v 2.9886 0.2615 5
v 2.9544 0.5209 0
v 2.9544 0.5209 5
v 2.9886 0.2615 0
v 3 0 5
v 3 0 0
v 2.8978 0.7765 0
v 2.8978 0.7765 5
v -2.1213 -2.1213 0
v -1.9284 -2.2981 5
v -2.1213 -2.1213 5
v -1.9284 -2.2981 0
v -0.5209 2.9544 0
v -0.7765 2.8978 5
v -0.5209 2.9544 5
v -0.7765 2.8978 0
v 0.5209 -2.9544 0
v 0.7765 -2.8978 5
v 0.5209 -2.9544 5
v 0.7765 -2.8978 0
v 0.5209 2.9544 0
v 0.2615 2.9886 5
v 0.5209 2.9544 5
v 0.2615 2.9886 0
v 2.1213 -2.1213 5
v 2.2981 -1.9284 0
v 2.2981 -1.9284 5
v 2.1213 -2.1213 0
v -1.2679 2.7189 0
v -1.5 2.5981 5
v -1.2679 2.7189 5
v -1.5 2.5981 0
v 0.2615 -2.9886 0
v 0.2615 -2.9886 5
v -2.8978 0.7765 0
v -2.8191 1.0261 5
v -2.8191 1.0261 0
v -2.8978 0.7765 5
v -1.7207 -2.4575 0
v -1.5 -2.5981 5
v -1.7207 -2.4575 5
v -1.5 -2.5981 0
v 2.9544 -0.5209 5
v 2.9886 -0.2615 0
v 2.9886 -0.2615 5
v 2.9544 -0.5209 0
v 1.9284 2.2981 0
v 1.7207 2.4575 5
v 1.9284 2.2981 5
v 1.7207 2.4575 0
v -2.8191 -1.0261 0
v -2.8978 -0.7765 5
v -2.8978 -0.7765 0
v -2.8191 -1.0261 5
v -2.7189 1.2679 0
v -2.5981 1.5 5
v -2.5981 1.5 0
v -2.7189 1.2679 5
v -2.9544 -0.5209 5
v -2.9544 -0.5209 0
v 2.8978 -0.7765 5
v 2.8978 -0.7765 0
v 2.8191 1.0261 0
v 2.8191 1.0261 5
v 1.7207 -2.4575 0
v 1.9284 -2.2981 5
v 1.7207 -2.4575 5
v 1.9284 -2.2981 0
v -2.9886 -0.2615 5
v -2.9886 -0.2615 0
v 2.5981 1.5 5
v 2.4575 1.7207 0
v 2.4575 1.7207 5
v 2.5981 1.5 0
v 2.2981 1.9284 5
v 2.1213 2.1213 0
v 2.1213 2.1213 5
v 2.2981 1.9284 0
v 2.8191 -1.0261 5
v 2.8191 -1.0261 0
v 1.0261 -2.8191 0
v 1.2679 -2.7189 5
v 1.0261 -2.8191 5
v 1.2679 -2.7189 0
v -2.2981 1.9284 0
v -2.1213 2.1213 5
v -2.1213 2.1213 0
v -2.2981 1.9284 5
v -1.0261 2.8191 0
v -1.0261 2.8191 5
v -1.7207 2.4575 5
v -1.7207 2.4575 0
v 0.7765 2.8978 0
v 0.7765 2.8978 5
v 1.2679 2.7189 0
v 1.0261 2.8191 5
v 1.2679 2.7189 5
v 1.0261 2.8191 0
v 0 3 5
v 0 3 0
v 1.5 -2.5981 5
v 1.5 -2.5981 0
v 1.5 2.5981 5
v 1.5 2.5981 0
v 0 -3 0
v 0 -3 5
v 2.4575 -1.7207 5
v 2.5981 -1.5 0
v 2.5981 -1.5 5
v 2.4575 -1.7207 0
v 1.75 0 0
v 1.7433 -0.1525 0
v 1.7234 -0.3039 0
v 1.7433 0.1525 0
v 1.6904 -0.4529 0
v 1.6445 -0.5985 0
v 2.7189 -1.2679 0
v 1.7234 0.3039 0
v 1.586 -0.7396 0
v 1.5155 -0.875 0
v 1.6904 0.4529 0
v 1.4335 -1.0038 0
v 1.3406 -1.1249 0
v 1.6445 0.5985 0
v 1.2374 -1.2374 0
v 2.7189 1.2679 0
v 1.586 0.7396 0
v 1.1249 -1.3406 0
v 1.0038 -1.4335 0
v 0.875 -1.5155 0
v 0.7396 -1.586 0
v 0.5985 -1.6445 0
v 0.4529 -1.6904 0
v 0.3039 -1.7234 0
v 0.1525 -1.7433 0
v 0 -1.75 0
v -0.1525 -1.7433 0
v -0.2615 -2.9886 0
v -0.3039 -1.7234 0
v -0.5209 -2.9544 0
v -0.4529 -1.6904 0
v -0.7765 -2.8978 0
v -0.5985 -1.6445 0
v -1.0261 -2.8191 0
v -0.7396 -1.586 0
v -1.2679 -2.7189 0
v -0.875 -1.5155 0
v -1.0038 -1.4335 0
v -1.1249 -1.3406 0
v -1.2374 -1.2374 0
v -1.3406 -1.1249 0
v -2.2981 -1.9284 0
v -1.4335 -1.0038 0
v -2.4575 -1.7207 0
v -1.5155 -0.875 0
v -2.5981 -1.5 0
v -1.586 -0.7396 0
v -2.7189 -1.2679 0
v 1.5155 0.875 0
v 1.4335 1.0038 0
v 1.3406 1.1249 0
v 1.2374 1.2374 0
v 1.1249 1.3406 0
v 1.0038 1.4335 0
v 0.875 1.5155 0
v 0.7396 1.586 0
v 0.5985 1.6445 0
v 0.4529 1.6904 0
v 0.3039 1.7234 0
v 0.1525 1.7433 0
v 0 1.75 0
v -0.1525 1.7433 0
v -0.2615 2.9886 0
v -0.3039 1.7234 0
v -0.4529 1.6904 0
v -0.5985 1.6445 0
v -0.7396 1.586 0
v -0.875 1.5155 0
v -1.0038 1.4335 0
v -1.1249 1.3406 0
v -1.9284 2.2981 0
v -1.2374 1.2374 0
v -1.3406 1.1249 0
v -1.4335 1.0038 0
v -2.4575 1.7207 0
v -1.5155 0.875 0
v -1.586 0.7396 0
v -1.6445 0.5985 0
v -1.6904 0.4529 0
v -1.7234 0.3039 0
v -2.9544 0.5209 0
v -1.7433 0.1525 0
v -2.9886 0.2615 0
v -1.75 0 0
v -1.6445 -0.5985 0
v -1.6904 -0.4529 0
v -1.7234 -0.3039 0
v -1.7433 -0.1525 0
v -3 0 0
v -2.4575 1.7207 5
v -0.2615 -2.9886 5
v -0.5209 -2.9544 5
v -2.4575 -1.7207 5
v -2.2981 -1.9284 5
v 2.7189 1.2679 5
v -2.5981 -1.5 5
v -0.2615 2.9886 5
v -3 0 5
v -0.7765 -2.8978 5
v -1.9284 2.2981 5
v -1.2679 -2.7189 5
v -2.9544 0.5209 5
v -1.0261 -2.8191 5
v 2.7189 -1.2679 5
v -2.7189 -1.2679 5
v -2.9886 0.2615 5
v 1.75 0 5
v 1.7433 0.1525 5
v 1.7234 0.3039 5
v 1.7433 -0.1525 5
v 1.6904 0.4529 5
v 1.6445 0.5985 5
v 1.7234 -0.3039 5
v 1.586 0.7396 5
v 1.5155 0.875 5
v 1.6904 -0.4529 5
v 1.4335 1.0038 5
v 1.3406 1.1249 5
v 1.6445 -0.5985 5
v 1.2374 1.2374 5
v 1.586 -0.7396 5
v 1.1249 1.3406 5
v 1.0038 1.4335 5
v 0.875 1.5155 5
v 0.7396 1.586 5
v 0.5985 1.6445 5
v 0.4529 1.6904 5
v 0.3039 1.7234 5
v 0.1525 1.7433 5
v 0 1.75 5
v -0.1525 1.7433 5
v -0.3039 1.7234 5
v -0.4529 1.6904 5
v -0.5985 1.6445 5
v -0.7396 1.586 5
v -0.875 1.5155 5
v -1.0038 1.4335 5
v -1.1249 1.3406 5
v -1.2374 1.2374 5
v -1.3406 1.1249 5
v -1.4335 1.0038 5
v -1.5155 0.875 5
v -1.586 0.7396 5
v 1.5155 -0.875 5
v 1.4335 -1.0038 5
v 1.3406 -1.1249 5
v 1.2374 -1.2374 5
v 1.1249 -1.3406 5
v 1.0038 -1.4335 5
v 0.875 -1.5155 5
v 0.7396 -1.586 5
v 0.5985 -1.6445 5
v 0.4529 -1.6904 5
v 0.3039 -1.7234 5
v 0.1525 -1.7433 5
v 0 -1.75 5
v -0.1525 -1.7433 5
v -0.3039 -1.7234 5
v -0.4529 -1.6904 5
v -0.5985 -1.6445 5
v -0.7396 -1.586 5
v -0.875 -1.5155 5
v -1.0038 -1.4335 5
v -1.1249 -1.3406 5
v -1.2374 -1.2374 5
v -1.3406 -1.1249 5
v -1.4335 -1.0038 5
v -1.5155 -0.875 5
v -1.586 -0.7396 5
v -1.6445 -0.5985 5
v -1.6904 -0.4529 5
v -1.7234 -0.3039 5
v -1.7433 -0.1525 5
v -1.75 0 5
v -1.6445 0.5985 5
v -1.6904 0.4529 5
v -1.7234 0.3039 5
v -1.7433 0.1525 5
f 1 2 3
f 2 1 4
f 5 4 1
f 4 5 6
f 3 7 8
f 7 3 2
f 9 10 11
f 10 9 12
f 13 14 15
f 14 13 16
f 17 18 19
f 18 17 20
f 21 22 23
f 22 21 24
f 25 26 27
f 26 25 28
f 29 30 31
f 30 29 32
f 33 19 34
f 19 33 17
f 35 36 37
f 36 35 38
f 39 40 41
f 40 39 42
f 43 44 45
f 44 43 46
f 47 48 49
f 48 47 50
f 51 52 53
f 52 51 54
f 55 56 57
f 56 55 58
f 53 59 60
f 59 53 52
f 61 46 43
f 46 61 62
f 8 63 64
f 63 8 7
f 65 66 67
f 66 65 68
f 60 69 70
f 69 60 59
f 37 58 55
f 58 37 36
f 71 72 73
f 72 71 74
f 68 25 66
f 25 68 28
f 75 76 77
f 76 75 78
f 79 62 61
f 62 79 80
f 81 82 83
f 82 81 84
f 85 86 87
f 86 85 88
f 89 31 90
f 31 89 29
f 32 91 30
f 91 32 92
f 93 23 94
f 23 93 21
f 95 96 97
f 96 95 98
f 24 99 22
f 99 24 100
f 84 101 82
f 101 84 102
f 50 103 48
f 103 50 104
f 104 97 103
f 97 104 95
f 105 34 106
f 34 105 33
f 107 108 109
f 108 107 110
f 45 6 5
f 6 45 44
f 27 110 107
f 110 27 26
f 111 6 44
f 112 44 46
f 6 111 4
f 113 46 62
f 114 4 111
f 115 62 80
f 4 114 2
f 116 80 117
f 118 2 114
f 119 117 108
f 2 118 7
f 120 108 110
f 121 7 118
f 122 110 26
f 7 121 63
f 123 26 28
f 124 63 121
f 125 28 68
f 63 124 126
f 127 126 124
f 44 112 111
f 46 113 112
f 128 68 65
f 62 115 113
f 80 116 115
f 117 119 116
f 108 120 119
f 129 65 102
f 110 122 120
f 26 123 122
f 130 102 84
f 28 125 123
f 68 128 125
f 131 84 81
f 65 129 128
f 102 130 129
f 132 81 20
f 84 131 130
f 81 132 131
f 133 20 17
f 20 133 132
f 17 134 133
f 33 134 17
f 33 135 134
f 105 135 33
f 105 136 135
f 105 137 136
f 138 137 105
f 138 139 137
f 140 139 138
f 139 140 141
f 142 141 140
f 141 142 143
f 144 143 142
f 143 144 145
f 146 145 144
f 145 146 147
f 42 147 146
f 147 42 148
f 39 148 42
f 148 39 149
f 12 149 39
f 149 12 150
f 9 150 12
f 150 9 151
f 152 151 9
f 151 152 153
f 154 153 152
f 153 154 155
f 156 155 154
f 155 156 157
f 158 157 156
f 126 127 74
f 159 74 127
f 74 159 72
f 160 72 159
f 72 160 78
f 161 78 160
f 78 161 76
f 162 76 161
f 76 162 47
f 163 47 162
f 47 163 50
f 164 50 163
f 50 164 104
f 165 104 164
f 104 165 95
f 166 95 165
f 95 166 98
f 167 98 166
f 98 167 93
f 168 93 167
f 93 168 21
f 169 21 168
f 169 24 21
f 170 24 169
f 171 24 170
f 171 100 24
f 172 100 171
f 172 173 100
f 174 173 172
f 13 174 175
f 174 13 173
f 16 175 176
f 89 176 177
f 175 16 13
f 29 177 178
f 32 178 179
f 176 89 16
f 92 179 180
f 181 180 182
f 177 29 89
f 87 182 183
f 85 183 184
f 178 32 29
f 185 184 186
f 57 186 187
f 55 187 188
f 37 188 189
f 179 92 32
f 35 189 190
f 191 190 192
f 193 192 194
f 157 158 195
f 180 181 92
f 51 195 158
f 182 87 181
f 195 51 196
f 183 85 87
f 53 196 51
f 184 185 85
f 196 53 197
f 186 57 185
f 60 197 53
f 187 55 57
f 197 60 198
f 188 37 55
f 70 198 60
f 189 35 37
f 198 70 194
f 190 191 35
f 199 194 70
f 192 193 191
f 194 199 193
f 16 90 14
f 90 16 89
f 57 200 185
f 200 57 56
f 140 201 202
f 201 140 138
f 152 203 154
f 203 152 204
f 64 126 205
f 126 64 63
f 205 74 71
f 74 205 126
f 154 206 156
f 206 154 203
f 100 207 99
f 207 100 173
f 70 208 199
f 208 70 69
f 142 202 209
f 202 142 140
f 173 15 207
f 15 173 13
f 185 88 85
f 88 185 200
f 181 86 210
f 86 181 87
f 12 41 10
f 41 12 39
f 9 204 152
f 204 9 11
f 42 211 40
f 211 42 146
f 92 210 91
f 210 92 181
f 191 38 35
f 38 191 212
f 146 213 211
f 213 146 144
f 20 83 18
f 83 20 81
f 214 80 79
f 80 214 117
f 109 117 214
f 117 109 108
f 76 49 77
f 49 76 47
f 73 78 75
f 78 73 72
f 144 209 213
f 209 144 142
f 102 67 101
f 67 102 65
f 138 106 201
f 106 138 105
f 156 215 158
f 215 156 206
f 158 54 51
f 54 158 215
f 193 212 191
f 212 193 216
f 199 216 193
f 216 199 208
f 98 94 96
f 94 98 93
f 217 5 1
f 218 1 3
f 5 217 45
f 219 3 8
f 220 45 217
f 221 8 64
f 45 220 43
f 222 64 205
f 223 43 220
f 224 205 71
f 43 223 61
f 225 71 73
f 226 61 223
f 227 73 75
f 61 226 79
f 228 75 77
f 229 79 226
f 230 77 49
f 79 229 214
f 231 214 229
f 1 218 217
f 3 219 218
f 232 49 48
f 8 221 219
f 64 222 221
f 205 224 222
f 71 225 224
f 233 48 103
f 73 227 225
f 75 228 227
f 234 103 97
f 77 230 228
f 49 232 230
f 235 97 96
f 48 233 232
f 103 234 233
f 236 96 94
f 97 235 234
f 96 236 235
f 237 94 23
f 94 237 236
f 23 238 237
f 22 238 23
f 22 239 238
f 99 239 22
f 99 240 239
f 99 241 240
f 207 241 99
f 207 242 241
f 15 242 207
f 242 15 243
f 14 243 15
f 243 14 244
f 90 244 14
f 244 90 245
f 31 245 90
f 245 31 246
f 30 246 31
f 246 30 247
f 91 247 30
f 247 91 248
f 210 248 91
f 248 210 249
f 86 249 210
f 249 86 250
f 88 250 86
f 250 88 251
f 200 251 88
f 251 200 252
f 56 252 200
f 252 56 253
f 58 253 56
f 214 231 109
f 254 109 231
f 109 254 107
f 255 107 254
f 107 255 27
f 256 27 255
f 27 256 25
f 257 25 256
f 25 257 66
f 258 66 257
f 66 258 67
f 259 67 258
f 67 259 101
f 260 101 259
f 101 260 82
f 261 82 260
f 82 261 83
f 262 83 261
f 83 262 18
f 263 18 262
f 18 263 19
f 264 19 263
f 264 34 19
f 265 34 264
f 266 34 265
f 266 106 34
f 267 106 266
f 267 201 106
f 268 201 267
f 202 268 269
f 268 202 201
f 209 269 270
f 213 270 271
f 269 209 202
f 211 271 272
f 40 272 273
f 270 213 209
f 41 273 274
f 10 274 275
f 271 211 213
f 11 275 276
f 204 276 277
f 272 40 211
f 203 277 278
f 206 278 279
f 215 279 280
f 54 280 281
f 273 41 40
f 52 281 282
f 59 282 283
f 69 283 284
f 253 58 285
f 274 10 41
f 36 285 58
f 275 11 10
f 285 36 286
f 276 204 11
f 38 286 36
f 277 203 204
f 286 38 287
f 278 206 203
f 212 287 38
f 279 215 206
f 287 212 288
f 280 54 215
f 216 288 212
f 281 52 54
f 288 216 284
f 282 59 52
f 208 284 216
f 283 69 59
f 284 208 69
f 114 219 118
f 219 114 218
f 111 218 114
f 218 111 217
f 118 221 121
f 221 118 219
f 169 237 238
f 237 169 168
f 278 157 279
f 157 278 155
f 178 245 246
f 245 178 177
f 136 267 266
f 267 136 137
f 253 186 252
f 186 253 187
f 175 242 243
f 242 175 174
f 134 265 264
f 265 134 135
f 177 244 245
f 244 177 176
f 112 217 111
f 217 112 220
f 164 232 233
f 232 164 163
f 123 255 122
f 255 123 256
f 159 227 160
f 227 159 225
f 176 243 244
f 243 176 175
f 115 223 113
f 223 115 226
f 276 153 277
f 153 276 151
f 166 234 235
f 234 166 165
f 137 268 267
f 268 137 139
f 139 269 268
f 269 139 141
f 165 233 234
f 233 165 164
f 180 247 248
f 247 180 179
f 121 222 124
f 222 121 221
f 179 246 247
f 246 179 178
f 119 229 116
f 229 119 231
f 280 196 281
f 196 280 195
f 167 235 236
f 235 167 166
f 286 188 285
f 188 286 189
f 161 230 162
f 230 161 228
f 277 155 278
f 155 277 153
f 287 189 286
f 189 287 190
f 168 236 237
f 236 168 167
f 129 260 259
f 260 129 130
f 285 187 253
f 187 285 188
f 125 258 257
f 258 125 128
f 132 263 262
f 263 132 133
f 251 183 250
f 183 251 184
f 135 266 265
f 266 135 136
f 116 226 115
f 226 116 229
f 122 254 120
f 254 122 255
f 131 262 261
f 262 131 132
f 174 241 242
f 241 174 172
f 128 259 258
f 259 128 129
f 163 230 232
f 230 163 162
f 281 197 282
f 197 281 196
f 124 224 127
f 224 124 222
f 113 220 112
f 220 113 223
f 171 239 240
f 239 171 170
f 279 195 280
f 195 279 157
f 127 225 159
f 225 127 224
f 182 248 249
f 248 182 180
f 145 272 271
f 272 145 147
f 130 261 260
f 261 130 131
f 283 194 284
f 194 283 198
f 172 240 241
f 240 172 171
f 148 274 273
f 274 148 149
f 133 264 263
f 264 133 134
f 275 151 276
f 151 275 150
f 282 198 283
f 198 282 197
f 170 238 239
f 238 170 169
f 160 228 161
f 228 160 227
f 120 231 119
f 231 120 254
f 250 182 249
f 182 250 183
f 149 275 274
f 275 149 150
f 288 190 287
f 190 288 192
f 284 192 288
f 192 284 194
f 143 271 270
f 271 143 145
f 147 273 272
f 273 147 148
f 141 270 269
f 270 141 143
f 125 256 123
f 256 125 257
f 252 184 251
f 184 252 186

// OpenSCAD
// file: param.scad
$fa = 5; //5  minimum=0.01
$fs = 0.1; //0.1  minimum=0.01

/////base params
R = 24;
r = 3;
l = 1.8; //eccentric shaft dist

/////roter
ecce = 1.8;
d_ecceshaft = 7.6;
l_eccesleeve_h = 0.5;
l_roter_thick = 3.5;
d_eccebearing = 14;
d_eccebearing_fr = 16.5;
l_eccebearing_h = 4;
l_eccebearing_fr = 0.8;


/////motor shaft
d_motshaft = 5;
l_motshaft = 8;//13;
l_motshafthld = l_motshaft+7;
l_motecceshaft = l_motshaft+11.7;

d_shaftholder = 10;


/////outer-pole
//spacer 3x6x5
d_pole = 6;
l_pole = 5;
d_pole_hole = 3.5;

d_pole_position = (R+r)*2;
ROTER2OUTERPIN_GAP = 0.15;


/////bottom-plate
l_bottmoplate_h = 4;

/////outpin
th_outp_angle = 22.5;
d_outp_position = 30;
d_outp_diameter = 3;



/////output-roter
d_output_hole = (d_outp_diameter/2 + l)*2;
l_output_h = 4;
// main file
include <param.scad>

difference(){
    cylinder(h=l_pole, r=d_pole/2);
    cylinder(h=l_pole, r=d_pole_hole/2);
}
